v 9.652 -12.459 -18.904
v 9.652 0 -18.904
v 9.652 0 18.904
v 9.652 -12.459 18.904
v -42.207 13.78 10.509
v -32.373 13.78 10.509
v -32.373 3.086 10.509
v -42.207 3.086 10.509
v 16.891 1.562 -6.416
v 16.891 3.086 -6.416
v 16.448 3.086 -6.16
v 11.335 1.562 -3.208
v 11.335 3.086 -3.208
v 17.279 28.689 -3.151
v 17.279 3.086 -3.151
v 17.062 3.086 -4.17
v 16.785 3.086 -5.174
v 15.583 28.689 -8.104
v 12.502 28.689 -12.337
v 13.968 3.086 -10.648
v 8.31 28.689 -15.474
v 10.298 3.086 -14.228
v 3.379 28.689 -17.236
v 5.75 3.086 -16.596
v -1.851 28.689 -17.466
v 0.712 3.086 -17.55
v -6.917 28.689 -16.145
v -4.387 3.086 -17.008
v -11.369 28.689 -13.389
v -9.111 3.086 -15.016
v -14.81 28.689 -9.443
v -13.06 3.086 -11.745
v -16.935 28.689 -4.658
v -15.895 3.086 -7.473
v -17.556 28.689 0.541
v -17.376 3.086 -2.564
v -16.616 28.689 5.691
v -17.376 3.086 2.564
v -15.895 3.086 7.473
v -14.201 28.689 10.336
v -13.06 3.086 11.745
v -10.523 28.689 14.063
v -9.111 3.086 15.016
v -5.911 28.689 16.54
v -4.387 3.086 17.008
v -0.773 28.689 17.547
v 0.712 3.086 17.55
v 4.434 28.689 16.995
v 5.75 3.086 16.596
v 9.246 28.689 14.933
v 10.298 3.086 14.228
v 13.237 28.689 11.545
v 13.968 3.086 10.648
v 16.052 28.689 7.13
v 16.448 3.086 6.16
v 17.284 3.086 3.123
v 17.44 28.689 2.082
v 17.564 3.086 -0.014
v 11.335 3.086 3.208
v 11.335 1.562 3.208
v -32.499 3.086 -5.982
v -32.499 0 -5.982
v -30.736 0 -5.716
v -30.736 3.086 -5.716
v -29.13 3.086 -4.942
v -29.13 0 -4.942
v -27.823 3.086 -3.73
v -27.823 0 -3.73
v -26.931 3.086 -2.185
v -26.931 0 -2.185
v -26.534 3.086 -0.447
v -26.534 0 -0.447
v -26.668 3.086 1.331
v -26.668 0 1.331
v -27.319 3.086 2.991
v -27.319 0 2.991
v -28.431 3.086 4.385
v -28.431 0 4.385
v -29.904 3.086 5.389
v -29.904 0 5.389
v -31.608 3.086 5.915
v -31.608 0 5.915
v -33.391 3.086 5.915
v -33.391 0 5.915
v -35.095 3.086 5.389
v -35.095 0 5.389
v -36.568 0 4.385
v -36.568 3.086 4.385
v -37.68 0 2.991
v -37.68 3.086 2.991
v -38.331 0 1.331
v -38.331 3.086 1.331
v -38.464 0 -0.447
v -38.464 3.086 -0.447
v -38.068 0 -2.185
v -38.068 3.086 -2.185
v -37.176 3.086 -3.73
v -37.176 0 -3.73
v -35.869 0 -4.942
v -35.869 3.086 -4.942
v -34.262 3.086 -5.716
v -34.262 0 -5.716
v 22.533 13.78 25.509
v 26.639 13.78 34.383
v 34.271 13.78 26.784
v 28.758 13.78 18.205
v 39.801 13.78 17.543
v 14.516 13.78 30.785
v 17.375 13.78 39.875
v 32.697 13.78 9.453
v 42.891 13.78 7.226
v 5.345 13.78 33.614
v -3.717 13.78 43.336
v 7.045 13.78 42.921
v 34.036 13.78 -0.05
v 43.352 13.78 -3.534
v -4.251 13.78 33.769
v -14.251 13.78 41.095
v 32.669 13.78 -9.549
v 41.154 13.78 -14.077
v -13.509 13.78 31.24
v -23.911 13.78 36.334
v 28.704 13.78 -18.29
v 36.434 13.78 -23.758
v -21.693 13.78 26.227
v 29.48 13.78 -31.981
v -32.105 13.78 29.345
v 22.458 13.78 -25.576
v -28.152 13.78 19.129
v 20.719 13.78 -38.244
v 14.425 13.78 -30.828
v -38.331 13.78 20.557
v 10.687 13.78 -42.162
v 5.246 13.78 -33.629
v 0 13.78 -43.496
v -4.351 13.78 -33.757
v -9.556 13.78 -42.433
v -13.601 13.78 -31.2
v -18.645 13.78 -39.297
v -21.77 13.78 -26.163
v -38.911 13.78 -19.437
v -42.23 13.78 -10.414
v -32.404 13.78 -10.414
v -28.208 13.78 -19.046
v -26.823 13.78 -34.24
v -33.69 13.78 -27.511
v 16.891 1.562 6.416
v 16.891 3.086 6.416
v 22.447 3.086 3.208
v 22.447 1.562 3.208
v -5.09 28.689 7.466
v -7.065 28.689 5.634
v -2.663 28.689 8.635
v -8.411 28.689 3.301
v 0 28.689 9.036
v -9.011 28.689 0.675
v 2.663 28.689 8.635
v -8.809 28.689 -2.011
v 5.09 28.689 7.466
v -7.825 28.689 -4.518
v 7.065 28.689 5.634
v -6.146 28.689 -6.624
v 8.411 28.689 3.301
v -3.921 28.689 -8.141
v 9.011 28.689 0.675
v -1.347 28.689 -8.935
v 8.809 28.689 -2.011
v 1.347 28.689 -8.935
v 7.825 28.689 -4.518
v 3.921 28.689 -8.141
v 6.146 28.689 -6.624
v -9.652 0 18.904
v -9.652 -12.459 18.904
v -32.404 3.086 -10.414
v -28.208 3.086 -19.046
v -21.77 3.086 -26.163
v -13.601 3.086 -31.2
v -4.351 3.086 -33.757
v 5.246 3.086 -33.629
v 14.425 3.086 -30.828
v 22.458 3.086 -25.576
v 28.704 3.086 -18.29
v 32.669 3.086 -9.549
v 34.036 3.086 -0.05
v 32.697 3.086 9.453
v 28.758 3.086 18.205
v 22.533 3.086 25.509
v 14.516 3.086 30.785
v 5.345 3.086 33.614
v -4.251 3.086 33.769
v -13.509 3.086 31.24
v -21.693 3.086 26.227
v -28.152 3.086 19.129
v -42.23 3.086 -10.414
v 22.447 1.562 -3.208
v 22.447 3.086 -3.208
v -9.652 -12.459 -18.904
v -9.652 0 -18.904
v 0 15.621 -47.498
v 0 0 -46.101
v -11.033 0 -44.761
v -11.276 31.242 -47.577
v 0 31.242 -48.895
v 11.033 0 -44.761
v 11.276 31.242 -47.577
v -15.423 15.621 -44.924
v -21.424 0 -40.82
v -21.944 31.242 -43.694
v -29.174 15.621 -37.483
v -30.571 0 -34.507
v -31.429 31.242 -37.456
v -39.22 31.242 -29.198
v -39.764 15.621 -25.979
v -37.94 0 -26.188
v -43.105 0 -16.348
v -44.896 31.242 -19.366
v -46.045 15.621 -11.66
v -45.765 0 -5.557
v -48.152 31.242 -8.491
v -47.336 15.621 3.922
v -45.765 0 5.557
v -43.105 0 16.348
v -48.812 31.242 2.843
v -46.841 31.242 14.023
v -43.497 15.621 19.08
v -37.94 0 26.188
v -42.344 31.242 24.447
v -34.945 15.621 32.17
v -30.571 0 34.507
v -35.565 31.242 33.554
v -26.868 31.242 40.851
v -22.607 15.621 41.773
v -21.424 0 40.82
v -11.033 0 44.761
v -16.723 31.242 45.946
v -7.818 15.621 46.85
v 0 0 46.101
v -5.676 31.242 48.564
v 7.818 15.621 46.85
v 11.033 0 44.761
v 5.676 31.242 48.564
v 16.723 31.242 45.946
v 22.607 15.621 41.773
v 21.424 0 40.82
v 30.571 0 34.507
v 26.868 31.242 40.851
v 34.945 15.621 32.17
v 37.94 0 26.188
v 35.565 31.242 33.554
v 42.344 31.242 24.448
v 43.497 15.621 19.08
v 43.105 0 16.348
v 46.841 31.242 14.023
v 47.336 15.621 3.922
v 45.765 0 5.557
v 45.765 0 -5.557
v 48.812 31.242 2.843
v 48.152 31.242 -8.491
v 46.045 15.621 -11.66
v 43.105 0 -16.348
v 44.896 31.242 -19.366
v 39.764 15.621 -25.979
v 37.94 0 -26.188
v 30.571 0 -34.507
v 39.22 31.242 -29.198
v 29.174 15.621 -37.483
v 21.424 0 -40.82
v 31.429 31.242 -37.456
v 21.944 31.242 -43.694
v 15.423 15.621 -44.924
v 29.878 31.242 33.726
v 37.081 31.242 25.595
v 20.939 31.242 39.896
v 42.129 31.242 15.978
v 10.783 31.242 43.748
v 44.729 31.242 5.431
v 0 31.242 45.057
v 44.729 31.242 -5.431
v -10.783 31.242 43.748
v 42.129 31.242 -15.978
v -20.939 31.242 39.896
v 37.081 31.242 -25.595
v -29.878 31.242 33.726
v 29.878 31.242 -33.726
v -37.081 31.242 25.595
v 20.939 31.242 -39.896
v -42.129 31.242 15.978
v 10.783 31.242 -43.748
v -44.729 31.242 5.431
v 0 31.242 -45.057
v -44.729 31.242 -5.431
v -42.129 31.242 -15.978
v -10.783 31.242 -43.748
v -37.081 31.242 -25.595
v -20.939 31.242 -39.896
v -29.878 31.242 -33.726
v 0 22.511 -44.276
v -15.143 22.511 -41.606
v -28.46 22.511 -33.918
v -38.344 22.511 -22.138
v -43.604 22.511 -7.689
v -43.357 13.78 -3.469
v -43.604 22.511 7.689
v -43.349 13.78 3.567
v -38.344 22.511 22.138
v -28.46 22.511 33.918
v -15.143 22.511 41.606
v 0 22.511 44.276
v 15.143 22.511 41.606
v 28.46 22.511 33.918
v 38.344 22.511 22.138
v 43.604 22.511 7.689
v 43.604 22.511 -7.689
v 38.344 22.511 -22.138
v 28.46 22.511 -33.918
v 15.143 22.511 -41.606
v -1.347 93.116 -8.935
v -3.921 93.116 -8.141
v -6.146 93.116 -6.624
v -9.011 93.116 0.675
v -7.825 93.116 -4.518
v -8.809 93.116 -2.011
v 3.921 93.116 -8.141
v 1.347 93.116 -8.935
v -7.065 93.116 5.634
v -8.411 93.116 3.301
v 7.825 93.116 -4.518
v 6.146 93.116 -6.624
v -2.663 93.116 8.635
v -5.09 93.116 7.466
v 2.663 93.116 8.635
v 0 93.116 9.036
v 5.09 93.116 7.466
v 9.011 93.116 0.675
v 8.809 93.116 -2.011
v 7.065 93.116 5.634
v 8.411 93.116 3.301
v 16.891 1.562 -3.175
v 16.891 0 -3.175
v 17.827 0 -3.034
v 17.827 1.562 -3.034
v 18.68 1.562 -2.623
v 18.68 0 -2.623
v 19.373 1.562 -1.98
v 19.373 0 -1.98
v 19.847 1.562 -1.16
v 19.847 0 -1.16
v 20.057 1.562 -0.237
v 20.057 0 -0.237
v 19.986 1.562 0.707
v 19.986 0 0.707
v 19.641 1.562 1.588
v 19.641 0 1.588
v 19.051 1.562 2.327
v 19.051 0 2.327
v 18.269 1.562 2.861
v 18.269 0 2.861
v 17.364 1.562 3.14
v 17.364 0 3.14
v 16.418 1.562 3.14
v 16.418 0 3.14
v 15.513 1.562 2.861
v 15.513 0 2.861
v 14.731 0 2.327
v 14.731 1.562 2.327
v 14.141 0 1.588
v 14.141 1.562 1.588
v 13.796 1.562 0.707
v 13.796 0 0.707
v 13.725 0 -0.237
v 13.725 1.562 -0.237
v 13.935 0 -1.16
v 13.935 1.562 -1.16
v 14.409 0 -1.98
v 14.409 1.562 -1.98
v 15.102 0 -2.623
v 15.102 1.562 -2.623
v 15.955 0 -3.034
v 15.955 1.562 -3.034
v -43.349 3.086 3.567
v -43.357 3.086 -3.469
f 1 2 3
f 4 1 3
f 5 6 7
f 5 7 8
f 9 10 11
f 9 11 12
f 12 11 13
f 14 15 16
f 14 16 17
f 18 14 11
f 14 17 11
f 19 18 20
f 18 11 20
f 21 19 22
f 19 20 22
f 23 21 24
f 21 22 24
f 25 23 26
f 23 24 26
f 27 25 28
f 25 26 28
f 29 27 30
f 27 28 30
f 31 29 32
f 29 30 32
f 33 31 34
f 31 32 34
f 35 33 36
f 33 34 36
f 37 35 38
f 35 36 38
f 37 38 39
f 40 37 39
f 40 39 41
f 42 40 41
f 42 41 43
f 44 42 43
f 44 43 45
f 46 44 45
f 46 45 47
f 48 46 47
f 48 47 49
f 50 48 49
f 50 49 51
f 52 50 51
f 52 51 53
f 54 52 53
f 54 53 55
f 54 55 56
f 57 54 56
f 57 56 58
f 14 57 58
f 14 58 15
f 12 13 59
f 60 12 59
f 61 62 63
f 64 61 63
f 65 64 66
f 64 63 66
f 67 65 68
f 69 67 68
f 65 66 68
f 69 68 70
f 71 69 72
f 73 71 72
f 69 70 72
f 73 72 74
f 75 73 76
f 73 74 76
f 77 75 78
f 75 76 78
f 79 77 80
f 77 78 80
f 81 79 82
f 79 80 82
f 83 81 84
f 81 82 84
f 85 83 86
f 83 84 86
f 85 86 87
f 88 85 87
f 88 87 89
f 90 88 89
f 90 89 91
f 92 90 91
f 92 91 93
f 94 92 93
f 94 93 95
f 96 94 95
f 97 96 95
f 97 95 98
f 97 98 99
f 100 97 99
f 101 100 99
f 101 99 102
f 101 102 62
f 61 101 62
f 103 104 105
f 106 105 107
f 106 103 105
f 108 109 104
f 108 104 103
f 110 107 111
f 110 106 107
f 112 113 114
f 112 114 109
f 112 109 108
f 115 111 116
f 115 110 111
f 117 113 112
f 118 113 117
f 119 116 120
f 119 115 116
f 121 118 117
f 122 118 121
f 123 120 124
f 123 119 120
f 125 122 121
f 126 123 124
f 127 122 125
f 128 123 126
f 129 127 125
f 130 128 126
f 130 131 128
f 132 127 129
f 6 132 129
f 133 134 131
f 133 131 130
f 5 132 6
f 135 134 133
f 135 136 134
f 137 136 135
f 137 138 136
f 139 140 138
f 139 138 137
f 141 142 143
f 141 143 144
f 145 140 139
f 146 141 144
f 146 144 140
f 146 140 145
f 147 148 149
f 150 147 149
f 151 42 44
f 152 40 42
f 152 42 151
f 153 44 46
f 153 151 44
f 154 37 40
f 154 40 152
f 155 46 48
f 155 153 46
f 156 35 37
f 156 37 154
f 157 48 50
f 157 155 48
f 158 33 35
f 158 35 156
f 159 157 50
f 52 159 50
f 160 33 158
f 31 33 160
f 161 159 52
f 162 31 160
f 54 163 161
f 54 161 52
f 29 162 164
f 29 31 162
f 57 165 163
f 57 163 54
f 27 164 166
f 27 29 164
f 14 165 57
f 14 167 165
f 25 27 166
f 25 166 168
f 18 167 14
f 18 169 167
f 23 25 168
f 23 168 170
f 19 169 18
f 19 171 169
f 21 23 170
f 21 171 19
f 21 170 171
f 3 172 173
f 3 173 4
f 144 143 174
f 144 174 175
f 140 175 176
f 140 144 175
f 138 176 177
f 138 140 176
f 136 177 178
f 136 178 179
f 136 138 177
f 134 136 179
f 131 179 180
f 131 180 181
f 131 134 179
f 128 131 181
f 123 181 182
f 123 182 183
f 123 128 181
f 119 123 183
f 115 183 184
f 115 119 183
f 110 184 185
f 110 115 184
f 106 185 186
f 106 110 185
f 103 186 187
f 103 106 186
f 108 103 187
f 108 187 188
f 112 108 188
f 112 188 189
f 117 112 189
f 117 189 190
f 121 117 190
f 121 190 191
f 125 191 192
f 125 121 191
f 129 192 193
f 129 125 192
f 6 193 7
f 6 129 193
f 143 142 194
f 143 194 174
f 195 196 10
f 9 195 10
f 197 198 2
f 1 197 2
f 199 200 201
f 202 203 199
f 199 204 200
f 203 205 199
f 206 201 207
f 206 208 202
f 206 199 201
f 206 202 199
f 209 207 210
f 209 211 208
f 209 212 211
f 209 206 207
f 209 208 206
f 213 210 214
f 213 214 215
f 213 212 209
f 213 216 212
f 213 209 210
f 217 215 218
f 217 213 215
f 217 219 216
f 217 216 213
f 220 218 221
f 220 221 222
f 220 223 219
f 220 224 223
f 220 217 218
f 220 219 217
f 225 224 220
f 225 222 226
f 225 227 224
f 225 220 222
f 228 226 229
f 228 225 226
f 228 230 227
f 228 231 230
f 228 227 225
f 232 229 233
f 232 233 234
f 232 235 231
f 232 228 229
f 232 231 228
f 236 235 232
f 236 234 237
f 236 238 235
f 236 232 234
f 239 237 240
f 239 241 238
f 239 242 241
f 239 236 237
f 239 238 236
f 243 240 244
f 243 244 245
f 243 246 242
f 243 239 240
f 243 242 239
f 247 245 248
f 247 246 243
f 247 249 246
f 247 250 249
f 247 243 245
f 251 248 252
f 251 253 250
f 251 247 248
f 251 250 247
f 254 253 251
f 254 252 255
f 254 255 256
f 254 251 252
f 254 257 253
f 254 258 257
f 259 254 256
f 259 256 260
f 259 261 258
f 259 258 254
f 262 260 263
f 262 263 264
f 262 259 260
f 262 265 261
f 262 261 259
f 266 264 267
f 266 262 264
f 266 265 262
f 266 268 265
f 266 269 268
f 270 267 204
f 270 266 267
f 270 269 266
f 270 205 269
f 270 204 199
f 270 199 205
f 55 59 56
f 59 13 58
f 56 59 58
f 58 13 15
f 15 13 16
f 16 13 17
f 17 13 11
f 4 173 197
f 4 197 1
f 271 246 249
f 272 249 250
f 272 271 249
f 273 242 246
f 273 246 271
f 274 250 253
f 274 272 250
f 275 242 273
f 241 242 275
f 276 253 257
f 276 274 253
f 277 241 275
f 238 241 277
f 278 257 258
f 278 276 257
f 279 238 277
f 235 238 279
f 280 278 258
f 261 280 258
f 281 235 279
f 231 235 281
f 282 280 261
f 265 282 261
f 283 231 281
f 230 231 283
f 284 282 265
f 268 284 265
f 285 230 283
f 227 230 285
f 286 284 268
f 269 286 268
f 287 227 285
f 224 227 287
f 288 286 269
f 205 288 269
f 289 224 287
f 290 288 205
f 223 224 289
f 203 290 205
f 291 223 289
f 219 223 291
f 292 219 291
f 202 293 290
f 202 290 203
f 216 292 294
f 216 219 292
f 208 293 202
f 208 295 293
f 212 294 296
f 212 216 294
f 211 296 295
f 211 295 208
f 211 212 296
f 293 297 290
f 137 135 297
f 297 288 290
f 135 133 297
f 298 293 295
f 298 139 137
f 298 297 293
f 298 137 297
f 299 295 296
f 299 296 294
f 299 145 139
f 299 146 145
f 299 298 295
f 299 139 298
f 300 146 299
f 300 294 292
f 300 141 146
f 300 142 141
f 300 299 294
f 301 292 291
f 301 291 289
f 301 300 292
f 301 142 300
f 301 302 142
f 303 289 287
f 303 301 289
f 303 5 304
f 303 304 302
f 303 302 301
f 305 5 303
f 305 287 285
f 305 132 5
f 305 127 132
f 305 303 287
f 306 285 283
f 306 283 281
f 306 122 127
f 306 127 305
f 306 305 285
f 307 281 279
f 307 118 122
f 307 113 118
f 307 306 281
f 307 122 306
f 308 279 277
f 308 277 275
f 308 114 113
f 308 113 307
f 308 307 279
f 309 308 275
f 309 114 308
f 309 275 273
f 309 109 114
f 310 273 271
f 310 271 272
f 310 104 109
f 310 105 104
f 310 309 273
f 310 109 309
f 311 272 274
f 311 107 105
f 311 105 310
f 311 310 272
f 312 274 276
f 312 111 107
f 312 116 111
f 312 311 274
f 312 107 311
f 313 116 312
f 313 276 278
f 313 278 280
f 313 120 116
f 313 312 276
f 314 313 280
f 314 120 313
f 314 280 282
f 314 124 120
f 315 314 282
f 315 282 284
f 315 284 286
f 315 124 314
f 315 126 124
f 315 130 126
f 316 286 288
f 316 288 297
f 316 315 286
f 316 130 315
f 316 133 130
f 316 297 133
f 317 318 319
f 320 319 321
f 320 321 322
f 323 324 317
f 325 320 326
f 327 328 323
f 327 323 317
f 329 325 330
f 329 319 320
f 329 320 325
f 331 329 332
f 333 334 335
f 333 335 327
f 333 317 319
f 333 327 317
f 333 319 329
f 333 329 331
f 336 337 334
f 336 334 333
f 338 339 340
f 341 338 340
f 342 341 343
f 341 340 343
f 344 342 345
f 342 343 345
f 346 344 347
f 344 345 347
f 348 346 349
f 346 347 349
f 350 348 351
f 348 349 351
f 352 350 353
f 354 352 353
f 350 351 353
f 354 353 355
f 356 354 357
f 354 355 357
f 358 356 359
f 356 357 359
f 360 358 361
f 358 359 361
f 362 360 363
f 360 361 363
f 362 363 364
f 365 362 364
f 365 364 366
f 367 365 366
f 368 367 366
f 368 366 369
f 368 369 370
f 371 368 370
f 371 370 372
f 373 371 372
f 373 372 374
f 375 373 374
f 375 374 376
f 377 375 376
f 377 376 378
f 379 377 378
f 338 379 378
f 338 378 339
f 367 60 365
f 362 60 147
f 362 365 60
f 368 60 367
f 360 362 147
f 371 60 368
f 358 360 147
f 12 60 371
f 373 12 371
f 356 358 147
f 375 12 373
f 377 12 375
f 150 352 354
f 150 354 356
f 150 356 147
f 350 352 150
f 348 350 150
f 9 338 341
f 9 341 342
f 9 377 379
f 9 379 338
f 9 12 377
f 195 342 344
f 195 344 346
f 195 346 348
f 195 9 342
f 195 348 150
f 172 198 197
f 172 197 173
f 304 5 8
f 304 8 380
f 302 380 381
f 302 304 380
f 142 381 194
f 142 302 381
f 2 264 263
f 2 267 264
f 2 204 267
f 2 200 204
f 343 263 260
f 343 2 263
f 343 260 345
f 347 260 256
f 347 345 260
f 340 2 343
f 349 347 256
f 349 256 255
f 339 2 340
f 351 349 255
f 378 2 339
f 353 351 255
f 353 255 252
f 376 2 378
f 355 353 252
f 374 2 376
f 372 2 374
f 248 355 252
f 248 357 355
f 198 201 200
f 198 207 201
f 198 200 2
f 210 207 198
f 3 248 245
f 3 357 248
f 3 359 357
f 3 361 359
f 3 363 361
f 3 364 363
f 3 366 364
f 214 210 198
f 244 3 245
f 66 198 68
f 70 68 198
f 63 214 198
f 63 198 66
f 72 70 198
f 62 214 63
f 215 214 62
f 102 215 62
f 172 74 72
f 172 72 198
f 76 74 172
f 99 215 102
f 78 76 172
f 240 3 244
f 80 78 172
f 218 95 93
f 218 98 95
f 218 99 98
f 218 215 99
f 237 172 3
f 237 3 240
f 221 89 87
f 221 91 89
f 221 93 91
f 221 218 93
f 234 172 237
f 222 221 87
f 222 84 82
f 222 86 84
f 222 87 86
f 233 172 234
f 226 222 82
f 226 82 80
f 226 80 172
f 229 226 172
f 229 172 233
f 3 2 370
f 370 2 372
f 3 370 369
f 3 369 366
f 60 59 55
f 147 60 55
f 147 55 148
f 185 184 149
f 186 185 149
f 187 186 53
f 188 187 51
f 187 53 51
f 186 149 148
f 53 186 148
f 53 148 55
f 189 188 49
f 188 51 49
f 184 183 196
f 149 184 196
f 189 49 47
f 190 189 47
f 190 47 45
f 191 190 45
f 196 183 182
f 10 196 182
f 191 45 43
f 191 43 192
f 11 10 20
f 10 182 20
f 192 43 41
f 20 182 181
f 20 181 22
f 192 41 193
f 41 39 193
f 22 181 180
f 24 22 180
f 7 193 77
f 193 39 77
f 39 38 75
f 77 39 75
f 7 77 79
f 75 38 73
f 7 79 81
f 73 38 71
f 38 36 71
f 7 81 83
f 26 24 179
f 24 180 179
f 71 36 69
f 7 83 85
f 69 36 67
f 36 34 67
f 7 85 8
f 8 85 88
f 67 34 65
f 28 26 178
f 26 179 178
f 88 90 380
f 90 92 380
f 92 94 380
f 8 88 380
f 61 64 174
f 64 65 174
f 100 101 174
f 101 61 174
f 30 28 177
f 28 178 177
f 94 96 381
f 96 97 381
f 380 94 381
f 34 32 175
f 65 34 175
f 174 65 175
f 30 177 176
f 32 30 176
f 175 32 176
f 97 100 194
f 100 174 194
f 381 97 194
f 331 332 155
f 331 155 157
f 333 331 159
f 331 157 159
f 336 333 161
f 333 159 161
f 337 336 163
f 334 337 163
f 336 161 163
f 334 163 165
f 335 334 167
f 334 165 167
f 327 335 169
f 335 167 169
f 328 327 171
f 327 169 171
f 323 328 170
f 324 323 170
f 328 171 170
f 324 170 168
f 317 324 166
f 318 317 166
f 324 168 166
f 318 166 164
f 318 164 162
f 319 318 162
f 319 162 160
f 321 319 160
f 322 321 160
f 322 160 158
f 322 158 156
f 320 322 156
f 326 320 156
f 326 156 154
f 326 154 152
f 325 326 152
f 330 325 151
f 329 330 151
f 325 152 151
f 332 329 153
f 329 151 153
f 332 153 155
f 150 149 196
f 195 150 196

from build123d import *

# Parameters (mm, degrees)
SKETCH2_R           = 3.175
SKETCH2_R_2         = 5.9817
CUT_EXTRUDE1_DEPTH  = 76.878222264
CUT_EXTRUDE3_DEPTH  = 10.6934
SKETCH5_W           = 19.304
SKETCH5_H           = 37.8079
BOSS_EXTRUDE1_DEPTH = 12.4587
SKETCH6_R           = 17.5641
BOSS_EXTRUDE2_DEPTH = 25.6032
SKETCH7_R           = 9.03605
BOSS_EXTRUDE3_DEPTH = 64.4271
CUT_EXTRUDE2_DEPTH  = 1.524


with BuildPart() as part:
    # Sketch1 → Revolve1 (revolve)
    with BuildSketch(Plane.XY, mode=Mode.PRIVATE) as revolve1_sk:
        Polygon((0, 0), (-46.101, 0), (-48.895, 31.242), (-45.0572124, 31.242), (-43.495525408, 13.7795), (0, 13.7795), align=None)
    revolve(revolve1_sk.sketch.rotate(Axis((0, 0, 0), (0, 1, 0)), 270), axis=Axis((0, 0, 0), (0, 1, 0)))

    # Sketch2 → Cut-Extrude1 (cut, through all)
    with BuildSketch(Plane.XZ):
        with Locations(Location((16.891, 0, 0), (0, 0, 270))):
            Circle(SKETCH2_R)
        with Locations(Location((-32.4993, 0, 0), (0, 0, 270))):
            Circle(SKETCH2_R_2)
    extrude(amount=-CUT_EXTRUDE1_DEPTH, mode=Mode.SUBTRACT)

    # Sketch4 → Cut-Extrude3 (cut)
    with BuildSketch(Plane(origin=(0, 13.7795, 0), x_dir=(1, 0, 0), z_dir=(0, 1, 0))):
        with BuildLine():
            Line((-32.372904727, -10.50925), (-42.206828772, -10.50925))
            ThreePointArc((-42.206828772, -10.50925), (-43.495497734, -0.049065379), (-42.23043138, 10.414))
            Line((-42.23043138, 10.414), (-32.403671088, 10.414))
            ThreePointArc((-32.403671088, 10.414), (34.035963204, 0.050047806), (-32.372904727, -10.50925))
        make_face()
    extrude(amount=-CUT_EXTRUDE3_DEPTH, mode=Mode.SUBTRACT)

    # Sketch5 → Boss-Extrude1 (add)
    with BuildSketch(Plane.XZ):
        Rectangle(SKETCH5_W, SKETCH5_H)
    extrude(amount=BOSS_EXTRUDE1_DEPTH)

    # Sketch6 → Boss-Extrude2 (add)
    with BuildSketch(Plane(origin=(0, 3.0861, 0), x_dir=(1, 0, 0), z_dir=(0, 1, 0))):
        with Locations(Location((0, 0, 0), (0, 0, 10.335443893))):
            Circle(SKETCH6_R)
    extrude(amount=BOSS_EXTRUDE2_DEPTH)

    # Sketch7 → Boss-Extrude3 (add)
    with BuildSketch(Plane(origin=(0, 28.6893, 0), x_dir=(1, 0, 0), z_dir=(0, 1, 0))):
        with Locations(Location((0, 0, 0), (0, 0, 270))):
            Circle(SKETCH7_R)
    extrude(amount=BOSS_EXTRUDE3_DEPTH)

    # Sketch3 → Cut-Extrude2 (cut)
    with BuildSketch(Plane(origin=(0, 3.0861, 0), x_dir=(1, 0, 0), z_dir=(0, 1, 0))):
        Polygon((22.44725, -3.207902433), (22.44725, 3.207902433), (16.891, 6.415804866), (11.33475, 3.207902433), (11.33475, -3.207902433), (16.891, -6.415804866), align=None)
    extrude(amount=-CUT_EXTRUDE2_DEPTH, mode=Mode.SUBTRACT)


solid = part.part
